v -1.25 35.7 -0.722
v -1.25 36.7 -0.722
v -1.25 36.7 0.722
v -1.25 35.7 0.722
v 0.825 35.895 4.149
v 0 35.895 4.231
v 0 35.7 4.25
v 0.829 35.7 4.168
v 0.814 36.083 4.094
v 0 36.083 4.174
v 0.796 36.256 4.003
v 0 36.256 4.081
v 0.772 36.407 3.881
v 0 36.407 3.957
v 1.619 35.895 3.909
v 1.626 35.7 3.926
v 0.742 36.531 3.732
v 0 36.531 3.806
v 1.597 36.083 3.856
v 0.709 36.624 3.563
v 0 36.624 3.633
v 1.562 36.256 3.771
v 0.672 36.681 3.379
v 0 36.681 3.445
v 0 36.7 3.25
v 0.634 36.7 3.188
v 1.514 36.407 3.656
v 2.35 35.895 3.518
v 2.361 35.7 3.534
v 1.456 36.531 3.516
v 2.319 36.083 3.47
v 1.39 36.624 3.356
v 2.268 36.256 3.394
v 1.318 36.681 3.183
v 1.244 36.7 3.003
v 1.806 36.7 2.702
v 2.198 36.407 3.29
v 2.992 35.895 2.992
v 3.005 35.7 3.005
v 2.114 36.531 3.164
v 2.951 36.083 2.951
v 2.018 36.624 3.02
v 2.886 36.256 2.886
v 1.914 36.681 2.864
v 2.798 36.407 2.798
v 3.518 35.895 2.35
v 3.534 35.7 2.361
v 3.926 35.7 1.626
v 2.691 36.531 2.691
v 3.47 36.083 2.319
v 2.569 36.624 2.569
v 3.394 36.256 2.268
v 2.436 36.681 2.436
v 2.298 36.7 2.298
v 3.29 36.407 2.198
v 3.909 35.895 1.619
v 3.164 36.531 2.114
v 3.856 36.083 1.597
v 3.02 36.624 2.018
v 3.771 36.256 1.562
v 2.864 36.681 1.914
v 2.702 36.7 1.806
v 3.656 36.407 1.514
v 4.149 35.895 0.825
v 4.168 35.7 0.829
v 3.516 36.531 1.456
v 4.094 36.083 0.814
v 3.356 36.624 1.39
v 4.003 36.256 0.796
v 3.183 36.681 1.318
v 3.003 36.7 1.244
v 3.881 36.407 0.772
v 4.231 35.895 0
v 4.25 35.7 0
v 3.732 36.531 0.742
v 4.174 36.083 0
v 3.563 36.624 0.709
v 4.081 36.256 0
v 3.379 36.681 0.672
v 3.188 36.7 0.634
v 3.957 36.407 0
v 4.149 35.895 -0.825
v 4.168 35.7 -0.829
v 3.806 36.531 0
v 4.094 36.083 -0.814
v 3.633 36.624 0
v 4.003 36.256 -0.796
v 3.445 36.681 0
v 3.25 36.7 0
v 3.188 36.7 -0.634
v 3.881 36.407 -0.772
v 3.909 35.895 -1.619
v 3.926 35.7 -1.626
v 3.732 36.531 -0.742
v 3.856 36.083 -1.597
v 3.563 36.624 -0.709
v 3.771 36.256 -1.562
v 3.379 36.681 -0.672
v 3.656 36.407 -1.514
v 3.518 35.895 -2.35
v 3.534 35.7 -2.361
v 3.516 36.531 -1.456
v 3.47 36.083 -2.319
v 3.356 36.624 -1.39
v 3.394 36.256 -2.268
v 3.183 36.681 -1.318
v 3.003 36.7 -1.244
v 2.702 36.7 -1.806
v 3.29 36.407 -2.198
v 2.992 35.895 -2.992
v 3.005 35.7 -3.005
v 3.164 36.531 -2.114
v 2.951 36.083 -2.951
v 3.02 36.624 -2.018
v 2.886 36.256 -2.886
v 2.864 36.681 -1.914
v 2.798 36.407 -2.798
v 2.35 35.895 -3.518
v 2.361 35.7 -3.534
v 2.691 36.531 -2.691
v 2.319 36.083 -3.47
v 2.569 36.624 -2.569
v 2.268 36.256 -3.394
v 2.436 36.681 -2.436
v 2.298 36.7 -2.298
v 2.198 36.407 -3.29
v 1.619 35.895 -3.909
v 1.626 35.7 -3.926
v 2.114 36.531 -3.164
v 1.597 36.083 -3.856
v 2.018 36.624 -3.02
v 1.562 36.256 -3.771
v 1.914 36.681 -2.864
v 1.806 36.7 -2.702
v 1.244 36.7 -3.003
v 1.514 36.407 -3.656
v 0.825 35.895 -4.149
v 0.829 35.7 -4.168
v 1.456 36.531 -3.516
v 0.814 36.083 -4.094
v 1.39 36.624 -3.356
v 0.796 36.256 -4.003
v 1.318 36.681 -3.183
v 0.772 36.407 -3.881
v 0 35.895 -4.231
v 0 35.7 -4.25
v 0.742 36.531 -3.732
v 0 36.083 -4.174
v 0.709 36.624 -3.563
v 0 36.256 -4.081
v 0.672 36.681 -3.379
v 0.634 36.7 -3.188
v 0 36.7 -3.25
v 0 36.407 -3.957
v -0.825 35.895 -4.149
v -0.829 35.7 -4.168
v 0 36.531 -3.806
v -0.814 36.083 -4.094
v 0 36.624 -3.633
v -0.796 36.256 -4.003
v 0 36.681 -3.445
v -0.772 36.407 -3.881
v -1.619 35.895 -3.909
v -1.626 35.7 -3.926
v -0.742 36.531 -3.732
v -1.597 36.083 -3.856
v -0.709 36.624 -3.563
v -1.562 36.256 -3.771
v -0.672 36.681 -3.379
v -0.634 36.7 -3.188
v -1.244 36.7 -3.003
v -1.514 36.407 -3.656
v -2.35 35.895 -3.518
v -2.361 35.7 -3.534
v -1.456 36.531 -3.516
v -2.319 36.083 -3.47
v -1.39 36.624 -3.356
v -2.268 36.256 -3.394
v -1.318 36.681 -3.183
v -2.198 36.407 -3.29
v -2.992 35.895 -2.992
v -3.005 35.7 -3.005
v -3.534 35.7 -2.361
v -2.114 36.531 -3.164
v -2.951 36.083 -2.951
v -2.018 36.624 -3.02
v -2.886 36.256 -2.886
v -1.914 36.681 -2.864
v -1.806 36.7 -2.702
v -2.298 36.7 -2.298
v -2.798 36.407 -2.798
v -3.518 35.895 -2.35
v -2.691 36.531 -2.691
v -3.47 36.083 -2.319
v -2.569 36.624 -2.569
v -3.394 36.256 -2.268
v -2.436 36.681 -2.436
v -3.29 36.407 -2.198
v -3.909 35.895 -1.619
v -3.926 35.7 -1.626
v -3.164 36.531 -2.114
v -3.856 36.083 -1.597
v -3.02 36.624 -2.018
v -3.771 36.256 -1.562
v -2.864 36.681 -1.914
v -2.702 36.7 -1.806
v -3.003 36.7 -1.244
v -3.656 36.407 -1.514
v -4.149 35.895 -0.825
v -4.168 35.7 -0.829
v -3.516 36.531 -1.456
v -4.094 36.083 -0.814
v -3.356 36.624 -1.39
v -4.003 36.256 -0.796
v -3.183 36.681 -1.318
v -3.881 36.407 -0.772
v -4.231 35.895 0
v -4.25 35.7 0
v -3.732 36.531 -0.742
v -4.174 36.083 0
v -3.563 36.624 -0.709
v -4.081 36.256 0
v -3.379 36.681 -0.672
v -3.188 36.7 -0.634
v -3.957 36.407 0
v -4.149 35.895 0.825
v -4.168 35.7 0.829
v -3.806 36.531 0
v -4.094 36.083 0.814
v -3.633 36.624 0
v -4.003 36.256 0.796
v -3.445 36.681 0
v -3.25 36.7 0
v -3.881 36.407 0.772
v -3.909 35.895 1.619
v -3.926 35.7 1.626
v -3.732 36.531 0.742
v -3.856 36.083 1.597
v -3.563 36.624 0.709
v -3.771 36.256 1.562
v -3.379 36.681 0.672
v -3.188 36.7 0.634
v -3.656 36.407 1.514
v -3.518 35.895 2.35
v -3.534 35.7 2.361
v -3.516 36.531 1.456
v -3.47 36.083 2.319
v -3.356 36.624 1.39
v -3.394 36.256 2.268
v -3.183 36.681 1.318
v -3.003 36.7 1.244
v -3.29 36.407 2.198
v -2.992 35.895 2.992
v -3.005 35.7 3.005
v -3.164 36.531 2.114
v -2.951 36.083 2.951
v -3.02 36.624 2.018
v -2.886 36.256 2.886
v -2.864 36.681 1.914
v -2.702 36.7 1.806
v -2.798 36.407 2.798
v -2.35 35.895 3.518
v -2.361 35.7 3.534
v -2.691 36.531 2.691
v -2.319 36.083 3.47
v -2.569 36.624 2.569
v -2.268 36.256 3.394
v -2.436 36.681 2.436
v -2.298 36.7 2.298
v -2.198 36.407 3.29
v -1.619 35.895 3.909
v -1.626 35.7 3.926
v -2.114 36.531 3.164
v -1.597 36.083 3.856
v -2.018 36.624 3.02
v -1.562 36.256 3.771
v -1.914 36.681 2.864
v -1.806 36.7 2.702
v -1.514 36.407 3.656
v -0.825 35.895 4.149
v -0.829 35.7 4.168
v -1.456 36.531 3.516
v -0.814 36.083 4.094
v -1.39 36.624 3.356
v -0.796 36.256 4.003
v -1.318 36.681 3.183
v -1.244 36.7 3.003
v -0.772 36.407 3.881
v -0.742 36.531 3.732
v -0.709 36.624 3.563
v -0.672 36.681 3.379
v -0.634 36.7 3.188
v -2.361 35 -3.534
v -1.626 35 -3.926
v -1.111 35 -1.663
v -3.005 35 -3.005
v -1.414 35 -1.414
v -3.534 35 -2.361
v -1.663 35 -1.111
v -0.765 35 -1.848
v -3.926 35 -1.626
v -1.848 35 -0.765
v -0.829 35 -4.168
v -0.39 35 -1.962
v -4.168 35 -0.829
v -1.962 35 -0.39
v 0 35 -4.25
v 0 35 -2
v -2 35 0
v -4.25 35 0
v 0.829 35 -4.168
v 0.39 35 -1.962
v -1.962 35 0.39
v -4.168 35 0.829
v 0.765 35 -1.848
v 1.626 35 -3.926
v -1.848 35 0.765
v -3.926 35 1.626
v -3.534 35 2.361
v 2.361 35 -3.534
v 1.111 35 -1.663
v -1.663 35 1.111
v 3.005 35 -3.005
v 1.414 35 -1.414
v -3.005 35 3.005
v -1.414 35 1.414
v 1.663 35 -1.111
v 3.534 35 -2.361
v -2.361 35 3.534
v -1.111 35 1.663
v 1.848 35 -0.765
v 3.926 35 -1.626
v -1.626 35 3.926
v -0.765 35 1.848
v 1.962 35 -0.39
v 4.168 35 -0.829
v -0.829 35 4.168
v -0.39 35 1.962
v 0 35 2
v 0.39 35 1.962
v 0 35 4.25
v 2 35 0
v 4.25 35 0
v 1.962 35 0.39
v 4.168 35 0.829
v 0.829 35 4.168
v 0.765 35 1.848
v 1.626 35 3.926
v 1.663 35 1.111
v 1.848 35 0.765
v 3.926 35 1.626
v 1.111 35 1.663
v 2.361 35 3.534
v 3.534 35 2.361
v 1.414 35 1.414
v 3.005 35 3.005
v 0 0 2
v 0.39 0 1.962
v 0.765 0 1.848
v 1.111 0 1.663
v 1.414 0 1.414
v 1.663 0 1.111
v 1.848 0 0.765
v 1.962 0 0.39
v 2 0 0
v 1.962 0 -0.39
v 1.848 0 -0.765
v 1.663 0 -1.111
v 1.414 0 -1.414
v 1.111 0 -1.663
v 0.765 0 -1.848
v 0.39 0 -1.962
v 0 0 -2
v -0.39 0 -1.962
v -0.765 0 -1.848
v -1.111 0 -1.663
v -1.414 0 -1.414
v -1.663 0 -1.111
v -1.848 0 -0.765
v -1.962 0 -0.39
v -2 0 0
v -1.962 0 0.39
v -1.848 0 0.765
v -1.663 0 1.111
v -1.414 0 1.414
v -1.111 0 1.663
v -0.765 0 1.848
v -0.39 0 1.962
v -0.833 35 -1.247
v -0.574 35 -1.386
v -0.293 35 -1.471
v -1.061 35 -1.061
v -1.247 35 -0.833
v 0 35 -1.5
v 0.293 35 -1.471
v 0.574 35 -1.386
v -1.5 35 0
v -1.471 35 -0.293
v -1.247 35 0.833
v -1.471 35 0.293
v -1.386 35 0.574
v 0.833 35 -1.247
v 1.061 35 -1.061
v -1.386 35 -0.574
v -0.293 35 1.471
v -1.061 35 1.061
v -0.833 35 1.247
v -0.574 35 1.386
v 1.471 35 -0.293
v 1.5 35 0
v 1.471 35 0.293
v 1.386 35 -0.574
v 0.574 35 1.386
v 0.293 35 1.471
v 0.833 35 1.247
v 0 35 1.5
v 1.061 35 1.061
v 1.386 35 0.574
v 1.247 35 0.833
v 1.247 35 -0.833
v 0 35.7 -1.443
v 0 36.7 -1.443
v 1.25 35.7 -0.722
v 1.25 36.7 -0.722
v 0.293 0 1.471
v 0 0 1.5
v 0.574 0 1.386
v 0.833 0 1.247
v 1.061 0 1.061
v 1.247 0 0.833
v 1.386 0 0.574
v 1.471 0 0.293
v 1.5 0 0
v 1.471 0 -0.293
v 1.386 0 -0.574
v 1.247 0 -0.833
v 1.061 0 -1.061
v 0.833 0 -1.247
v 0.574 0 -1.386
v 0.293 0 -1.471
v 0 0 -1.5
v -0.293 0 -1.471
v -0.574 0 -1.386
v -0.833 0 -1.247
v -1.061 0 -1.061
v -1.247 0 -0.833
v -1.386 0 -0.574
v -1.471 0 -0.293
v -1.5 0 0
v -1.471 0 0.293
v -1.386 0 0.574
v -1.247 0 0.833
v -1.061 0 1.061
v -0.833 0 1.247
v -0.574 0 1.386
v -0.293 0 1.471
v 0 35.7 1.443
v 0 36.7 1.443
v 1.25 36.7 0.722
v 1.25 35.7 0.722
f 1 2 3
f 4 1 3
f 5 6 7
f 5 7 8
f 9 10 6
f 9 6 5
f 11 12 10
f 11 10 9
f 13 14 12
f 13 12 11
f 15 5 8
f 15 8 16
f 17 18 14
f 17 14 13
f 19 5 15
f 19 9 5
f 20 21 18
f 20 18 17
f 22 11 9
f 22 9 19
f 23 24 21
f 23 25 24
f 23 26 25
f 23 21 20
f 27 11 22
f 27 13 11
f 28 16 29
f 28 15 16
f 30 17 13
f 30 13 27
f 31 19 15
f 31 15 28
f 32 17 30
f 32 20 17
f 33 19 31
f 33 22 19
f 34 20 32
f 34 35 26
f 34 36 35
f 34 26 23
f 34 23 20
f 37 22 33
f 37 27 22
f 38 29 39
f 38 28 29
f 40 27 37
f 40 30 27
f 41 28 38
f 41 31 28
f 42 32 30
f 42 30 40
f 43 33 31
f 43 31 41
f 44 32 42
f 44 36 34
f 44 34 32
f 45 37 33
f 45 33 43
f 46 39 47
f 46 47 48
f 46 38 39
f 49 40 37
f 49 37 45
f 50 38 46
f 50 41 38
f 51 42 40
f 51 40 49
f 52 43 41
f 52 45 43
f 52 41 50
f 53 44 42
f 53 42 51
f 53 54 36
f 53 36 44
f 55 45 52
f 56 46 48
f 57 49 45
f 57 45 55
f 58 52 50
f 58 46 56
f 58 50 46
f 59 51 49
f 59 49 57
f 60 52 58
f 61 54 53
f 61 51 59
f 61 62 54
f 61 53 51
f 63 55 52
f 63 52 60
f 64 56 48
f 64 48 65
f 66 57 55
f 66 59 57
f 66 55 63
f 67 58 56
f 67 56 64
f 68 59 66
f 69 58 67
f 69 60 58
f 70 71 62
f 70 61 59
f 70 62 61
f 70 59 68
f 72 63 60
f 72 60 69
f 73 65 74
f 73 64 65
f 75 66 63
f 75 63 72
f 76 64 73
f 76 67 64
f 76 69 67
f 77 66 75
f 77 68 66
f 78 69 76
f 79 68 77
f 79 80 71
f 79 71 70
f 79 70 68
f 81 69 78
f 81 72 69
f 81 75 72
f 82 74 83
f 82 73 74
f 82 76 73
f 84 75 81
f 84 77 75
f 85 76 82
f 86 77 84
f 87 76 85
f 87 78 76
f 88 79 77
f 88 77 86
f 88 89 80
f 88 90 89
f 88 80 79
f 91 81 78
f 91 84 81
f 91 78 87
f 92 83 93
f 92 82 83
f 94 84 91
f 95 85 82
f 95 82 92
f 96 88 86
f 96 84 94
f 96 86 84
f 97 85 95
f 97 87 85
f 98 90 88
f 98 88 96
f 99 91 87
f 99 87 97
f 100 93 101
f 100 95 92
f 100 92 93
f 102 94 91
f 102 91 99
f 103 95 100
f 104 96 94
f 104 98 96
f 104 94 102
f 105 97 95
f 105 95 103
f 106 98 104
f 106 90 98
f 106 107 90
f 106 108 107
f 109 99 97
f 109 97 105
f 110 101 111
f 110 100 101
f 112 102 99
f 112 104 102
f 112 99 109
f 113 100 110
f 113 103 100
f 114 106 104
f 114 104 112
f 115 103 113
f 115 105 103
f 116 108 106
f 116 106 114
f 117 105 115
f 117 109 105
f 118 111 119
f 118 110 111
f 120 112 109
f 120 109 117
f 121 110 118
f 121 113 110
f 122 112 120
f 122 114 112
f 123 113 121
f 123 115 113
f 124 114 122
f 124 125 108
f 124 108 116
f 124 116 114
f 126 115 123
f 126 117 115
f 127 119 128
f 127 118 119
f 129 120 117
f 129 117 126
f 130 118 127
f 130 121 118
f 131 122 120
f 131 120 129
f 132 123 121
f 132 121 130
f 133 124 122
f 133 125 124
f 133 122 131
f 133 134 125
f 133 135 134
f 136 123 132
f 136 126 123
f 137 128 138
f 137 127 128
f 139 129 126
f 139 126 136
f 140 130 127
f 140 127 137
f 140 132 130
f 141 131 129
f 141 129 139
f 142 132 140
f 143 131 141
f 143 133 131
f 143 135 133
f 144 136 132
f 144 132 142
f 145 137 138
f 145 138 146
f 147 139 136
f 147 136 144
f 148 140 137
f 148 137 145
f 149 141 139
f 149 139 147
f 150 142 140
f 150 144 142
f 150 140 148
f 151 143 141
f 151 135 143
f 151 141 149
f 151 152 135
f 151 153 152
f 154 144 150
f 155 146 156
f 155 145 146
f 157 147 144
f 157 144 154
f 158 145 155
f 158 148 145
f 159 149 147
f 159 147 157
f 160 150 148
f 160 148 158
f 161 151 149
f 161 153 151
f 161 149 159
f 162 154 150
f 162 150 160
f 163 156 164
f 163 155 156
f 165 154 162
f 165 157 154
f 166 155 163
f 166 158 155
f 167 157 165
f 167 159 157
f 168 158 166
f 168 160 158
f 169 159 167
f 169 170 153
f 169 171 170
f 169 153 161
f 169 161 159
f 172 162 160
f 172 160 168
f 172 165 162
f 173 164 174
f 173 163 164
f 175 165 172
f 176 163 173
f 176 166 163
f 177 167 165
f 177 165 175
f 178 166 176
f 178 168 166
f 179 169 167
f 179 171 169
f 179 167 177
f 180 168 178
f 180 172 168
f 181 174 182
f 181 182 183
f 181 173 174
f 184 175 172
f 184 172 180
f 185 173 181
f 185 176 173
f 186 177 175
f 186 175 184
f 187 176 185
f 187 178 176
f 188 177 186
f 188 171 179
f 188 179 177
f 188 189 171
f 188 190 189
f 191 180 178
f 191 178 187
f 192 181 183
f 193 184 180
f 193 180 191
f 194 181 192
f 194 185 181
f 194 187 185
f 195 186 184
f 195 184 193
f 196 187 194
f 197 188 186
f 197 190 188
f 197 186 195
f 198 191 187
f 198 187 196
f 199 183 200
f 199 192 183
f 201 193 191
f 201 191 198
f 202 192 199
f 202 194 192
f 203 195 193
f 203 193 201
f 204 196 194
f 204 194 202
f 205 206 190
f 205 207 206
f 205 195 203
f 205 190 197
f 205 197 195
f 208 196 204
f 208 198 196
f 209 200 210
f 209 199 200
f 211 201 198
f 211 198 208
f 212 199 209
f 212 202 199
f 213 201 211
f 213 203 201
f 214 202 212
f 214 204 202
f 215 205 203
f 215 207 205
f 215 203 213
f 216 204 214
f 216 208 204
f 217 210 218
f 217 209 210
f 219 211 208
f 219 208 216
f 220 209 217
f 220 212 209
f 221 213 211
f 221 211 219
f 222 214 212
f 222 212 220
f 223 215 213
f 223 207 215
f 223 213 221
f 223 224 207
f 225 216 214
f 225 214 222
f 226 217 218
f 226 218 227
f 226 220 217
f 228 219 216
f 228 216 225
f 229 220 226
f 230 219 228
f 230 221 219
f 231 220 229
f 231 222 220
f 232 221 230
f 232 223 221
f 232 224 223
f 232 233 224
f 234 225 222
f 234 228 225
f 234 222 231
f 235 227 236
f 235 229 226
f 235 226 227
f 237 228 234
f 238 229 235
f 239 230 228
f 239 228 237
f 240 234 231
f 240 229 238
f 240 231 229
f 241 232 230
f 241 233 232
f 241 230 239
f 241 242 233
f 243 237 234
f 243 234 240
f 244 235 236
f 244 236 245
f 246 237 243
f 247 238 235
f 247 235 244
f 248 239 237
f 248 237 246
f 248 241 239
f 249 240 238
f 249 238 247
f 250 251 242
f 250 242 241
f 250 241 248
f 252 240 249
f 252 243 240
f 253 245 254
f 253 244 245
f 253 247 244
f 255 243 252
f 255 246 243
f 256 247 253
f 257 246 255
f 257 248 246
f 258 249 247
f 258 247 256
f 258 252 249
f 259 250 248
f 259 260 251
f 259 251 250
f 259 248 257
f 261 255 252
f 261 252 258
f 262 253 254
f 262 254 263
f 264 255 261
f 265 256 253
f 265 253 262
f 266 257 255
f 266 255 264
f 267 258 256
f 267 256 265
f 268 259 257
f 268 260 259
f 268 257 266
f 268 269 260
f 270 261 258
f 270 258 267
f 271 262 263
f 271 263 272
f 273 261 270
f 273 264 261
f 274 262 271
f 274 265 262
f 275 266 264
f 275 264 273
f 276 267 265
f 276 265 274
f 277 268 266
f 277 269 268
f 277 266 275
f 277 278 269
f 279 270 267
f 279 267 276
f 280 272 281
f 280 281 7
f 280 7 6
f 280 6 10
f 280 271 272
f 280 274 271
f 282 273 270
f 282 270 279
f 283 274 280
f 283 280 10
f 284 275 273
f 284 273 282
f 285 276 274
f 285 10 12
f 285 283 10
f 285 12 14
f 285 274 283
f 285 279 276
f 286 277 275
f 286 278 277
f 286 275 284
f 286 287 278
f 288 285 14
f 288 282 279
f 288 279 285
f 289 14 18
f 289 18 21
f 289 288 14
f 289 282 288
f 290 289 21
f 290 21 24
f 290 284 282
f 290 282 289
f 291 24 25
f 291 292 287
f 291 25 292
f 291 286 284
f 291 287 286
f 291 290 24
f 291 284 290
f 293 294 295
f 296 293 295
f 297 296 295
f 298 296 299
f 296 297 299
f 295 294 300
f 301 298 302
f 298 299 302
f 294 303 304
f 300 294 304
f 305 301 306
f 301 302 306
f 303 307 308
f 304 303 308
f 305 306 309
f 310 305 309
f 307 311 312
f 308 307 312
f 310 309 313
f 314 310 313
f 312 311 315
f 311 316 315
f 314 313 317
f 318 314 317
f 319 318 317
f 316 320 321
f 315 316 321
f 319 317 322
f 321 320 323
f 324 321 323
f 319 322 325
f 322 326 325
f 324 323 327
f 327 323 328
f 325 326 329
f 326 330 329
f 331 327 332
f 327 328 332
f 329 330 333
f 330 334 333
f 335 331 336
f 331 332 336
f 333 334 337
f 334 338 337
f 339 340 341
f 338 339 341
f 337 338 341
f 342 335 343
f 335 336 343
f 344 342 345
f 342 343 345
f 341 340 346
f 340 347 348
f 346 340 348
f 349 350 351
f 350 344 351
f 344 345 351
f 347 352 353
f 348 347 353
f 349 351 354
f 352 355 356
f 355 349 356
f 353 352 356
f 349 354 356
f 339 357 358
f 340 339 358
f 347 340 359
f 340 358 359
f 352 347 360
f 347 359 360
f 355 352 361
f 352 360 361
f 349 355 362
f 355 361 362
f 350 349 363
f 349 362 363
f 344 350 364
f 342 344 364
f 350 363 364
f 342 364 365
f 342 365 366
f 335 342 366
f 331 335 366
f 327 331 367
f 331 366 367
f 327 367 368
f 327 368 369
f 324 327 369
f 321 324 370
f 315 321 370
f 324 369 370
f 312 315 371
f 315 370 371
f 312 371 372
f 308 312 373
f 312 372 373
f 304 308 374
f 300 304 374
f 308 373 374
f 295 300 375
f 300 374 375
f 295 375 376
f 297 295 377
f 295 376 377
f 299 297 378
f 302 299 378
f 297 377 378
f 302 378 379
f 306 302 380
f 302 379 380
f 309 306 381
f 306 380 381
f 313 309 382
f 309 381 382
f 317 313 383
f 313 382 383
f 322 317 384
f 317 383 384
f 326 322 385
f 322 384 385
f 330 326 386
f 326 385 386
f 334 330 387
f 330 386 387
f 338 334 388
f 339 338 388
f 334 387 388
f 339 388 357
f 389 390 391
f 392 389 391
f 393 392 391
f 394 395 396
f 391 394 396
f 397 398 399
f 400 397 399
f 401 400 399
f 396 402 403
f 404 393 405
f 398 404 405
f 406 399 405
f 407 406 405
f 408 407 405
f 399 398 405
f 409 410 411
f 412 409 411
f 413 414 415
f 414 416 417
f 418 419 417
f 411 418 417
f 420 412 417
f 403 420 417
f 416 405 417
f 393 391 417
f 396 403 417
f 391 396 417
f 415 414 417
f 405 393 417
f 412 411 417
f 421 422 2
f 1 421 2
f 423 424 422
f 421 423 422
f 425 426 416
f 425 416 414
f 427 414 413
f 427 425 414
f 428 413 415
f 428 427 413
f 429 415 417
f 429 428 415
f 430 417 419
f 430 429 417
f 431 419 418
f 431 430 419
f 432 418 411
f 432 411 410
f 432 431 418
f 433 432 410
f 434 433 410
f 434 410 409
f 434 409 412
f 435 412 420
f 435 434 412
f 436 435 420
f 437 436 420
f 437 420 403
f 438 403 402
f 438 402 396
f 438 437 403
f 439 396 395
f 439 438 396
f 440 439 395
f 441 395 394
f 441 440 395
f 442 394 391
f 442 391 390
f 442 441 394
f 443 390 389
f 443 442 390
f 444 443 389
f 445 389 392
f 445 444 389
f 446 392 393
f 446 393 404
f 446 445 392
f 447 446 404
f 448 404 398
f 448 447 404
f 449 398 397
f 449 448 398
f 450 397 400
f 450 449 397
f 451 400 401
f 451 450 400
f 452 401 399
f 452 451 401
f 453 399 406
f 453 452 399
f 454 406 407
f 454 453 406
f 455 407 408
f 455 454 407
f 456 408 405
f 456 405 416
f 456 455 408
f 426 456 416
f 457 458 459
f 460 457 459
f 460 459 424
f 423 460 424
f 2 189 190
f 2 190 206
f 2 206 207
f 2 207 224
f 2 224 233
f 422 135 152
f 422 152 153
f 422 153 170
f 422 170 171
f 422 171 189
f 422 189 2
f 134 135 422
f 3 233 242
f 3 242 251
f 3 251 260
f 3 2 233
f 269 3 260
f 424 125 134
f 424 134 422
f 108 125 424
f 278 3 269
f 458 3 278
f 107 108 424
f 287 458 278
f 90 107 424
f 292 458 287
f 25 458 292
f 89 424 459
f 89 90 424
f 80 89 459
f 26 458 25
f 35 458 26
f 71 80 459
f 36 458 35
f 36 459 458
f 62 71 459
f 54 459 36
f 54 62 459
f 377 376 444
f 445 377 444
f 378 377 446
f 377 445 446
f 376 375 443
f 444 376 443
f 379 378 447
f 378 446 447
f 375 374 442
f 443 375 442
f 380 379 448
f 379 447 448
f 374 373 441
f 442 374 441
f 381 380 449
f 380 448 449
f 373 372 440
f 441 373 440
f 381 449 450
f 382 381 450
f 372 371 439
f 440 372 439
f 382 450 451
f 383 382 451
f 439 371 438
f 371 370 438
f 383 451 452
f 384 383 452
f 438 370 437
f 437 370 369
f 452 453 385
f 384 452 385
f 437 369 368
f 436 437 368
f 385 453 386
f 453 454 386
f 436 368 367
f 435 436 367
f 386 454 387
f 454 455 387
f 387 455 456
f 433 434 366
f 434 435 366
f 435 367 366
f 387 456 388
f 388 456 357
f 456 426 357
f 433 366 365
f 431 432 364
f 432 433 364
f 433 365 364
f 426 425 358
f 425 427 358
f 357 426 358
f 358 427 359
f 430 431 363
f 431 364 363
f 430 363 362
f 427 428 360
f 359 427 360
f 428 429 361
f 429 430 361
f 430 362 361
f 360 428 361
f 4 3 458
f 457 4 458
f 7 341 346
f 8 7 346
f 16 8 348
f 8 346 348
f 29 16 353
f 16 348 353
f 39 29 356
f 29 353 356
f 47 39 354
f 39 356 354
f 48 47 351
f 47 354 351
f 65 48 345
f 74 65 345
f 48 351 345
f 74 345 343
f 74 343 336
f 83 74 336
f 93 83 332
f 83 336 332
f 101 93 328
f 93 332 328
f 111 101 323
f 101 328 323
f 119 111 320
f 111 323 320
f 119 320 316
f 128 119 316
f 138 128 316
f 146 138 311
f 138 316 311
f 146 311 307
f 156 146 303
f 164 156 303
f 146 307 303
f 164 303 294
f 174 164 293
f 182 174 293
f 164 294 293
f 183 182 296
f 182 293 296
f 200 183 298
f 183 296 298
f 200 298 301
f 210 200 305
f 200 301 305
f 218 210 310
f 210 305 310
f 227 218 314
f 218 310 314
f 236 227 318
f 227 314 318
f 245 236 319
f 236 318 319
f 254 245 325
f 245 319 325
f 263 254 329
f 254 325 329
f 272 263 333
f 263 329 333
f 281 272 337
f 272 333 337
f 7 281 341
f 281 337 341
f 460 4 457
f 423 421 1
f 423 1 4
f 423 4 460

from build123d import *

# Parameters (mm, degrees)
SKETCH_1_R          = 2
SKETCH_1_R_2        = 1.5
EXTRUDE_1_DEPTH     = 35
SKETCH_2_R          = 4.25
EXTRUDE_2_DEPTH     = 1.7
CUT_EXTRUDE_1_DEPTH = 1
FILLET_1_R          = 1


with BuildPart() as part:
    # 草图1 → 凸台-拉伸1 (new body)
    with BuildSketch(Plane(origin=(0, 0, 0), x_dir=(1, 0, 0), z_dir=(0, 1, 0))):
        with Locations(Location((0, 0, 0), (0, 0, 270))):
            Circle(SKETCH_1_R)
        with Locations(Location((0, 0, 0), (0, 0, 270))):
            Circle(SKETCH_1_R_2, mode=Mode.SUBTRACT)
    extrude(amount=EXTRUDE_1_DEPTH)

    # 草图2 → 凸台-拉伸2 (add)
    with BuildSketch(Plane(origin=(0, 35, 0), x_dir=(1, 0, 0), z_dir=(0, 1, 0))):
        with Locations(Location((0, 0, 0), (0, 0, 270))):
            Circle(SKETCH_2_R)
    extrude(amount=EXTRUDE_2_DEPTH)

    # 草图3 → 切除-拉伸1 (cut)
    with BuildSketch(Plane(origin=(0, 36.7, 0), x_dir=(1, 0, 0), z_dir=(0, 1, 0))):
        Polygon((1.25, 0.721687836), (0, 1.443375673), (-1.25, 0.721687836), (-1.25, -0.721687836), (0, -1.443375673), (1.25, -0.721687836), align=None)
    extrude(amount=-CUT_EXTRUDE_1_DEPTH, mode=Mode.SUBTRACT)

    # 圆角1
    fillet_1_edges = [part.edges().sort_by_distance(p)[0] for p in [
        (0, 36.7, -4.25),
    ]]
    fillet(fillet_1_edges, radius=FILLET_1_R)


solid = part.part
